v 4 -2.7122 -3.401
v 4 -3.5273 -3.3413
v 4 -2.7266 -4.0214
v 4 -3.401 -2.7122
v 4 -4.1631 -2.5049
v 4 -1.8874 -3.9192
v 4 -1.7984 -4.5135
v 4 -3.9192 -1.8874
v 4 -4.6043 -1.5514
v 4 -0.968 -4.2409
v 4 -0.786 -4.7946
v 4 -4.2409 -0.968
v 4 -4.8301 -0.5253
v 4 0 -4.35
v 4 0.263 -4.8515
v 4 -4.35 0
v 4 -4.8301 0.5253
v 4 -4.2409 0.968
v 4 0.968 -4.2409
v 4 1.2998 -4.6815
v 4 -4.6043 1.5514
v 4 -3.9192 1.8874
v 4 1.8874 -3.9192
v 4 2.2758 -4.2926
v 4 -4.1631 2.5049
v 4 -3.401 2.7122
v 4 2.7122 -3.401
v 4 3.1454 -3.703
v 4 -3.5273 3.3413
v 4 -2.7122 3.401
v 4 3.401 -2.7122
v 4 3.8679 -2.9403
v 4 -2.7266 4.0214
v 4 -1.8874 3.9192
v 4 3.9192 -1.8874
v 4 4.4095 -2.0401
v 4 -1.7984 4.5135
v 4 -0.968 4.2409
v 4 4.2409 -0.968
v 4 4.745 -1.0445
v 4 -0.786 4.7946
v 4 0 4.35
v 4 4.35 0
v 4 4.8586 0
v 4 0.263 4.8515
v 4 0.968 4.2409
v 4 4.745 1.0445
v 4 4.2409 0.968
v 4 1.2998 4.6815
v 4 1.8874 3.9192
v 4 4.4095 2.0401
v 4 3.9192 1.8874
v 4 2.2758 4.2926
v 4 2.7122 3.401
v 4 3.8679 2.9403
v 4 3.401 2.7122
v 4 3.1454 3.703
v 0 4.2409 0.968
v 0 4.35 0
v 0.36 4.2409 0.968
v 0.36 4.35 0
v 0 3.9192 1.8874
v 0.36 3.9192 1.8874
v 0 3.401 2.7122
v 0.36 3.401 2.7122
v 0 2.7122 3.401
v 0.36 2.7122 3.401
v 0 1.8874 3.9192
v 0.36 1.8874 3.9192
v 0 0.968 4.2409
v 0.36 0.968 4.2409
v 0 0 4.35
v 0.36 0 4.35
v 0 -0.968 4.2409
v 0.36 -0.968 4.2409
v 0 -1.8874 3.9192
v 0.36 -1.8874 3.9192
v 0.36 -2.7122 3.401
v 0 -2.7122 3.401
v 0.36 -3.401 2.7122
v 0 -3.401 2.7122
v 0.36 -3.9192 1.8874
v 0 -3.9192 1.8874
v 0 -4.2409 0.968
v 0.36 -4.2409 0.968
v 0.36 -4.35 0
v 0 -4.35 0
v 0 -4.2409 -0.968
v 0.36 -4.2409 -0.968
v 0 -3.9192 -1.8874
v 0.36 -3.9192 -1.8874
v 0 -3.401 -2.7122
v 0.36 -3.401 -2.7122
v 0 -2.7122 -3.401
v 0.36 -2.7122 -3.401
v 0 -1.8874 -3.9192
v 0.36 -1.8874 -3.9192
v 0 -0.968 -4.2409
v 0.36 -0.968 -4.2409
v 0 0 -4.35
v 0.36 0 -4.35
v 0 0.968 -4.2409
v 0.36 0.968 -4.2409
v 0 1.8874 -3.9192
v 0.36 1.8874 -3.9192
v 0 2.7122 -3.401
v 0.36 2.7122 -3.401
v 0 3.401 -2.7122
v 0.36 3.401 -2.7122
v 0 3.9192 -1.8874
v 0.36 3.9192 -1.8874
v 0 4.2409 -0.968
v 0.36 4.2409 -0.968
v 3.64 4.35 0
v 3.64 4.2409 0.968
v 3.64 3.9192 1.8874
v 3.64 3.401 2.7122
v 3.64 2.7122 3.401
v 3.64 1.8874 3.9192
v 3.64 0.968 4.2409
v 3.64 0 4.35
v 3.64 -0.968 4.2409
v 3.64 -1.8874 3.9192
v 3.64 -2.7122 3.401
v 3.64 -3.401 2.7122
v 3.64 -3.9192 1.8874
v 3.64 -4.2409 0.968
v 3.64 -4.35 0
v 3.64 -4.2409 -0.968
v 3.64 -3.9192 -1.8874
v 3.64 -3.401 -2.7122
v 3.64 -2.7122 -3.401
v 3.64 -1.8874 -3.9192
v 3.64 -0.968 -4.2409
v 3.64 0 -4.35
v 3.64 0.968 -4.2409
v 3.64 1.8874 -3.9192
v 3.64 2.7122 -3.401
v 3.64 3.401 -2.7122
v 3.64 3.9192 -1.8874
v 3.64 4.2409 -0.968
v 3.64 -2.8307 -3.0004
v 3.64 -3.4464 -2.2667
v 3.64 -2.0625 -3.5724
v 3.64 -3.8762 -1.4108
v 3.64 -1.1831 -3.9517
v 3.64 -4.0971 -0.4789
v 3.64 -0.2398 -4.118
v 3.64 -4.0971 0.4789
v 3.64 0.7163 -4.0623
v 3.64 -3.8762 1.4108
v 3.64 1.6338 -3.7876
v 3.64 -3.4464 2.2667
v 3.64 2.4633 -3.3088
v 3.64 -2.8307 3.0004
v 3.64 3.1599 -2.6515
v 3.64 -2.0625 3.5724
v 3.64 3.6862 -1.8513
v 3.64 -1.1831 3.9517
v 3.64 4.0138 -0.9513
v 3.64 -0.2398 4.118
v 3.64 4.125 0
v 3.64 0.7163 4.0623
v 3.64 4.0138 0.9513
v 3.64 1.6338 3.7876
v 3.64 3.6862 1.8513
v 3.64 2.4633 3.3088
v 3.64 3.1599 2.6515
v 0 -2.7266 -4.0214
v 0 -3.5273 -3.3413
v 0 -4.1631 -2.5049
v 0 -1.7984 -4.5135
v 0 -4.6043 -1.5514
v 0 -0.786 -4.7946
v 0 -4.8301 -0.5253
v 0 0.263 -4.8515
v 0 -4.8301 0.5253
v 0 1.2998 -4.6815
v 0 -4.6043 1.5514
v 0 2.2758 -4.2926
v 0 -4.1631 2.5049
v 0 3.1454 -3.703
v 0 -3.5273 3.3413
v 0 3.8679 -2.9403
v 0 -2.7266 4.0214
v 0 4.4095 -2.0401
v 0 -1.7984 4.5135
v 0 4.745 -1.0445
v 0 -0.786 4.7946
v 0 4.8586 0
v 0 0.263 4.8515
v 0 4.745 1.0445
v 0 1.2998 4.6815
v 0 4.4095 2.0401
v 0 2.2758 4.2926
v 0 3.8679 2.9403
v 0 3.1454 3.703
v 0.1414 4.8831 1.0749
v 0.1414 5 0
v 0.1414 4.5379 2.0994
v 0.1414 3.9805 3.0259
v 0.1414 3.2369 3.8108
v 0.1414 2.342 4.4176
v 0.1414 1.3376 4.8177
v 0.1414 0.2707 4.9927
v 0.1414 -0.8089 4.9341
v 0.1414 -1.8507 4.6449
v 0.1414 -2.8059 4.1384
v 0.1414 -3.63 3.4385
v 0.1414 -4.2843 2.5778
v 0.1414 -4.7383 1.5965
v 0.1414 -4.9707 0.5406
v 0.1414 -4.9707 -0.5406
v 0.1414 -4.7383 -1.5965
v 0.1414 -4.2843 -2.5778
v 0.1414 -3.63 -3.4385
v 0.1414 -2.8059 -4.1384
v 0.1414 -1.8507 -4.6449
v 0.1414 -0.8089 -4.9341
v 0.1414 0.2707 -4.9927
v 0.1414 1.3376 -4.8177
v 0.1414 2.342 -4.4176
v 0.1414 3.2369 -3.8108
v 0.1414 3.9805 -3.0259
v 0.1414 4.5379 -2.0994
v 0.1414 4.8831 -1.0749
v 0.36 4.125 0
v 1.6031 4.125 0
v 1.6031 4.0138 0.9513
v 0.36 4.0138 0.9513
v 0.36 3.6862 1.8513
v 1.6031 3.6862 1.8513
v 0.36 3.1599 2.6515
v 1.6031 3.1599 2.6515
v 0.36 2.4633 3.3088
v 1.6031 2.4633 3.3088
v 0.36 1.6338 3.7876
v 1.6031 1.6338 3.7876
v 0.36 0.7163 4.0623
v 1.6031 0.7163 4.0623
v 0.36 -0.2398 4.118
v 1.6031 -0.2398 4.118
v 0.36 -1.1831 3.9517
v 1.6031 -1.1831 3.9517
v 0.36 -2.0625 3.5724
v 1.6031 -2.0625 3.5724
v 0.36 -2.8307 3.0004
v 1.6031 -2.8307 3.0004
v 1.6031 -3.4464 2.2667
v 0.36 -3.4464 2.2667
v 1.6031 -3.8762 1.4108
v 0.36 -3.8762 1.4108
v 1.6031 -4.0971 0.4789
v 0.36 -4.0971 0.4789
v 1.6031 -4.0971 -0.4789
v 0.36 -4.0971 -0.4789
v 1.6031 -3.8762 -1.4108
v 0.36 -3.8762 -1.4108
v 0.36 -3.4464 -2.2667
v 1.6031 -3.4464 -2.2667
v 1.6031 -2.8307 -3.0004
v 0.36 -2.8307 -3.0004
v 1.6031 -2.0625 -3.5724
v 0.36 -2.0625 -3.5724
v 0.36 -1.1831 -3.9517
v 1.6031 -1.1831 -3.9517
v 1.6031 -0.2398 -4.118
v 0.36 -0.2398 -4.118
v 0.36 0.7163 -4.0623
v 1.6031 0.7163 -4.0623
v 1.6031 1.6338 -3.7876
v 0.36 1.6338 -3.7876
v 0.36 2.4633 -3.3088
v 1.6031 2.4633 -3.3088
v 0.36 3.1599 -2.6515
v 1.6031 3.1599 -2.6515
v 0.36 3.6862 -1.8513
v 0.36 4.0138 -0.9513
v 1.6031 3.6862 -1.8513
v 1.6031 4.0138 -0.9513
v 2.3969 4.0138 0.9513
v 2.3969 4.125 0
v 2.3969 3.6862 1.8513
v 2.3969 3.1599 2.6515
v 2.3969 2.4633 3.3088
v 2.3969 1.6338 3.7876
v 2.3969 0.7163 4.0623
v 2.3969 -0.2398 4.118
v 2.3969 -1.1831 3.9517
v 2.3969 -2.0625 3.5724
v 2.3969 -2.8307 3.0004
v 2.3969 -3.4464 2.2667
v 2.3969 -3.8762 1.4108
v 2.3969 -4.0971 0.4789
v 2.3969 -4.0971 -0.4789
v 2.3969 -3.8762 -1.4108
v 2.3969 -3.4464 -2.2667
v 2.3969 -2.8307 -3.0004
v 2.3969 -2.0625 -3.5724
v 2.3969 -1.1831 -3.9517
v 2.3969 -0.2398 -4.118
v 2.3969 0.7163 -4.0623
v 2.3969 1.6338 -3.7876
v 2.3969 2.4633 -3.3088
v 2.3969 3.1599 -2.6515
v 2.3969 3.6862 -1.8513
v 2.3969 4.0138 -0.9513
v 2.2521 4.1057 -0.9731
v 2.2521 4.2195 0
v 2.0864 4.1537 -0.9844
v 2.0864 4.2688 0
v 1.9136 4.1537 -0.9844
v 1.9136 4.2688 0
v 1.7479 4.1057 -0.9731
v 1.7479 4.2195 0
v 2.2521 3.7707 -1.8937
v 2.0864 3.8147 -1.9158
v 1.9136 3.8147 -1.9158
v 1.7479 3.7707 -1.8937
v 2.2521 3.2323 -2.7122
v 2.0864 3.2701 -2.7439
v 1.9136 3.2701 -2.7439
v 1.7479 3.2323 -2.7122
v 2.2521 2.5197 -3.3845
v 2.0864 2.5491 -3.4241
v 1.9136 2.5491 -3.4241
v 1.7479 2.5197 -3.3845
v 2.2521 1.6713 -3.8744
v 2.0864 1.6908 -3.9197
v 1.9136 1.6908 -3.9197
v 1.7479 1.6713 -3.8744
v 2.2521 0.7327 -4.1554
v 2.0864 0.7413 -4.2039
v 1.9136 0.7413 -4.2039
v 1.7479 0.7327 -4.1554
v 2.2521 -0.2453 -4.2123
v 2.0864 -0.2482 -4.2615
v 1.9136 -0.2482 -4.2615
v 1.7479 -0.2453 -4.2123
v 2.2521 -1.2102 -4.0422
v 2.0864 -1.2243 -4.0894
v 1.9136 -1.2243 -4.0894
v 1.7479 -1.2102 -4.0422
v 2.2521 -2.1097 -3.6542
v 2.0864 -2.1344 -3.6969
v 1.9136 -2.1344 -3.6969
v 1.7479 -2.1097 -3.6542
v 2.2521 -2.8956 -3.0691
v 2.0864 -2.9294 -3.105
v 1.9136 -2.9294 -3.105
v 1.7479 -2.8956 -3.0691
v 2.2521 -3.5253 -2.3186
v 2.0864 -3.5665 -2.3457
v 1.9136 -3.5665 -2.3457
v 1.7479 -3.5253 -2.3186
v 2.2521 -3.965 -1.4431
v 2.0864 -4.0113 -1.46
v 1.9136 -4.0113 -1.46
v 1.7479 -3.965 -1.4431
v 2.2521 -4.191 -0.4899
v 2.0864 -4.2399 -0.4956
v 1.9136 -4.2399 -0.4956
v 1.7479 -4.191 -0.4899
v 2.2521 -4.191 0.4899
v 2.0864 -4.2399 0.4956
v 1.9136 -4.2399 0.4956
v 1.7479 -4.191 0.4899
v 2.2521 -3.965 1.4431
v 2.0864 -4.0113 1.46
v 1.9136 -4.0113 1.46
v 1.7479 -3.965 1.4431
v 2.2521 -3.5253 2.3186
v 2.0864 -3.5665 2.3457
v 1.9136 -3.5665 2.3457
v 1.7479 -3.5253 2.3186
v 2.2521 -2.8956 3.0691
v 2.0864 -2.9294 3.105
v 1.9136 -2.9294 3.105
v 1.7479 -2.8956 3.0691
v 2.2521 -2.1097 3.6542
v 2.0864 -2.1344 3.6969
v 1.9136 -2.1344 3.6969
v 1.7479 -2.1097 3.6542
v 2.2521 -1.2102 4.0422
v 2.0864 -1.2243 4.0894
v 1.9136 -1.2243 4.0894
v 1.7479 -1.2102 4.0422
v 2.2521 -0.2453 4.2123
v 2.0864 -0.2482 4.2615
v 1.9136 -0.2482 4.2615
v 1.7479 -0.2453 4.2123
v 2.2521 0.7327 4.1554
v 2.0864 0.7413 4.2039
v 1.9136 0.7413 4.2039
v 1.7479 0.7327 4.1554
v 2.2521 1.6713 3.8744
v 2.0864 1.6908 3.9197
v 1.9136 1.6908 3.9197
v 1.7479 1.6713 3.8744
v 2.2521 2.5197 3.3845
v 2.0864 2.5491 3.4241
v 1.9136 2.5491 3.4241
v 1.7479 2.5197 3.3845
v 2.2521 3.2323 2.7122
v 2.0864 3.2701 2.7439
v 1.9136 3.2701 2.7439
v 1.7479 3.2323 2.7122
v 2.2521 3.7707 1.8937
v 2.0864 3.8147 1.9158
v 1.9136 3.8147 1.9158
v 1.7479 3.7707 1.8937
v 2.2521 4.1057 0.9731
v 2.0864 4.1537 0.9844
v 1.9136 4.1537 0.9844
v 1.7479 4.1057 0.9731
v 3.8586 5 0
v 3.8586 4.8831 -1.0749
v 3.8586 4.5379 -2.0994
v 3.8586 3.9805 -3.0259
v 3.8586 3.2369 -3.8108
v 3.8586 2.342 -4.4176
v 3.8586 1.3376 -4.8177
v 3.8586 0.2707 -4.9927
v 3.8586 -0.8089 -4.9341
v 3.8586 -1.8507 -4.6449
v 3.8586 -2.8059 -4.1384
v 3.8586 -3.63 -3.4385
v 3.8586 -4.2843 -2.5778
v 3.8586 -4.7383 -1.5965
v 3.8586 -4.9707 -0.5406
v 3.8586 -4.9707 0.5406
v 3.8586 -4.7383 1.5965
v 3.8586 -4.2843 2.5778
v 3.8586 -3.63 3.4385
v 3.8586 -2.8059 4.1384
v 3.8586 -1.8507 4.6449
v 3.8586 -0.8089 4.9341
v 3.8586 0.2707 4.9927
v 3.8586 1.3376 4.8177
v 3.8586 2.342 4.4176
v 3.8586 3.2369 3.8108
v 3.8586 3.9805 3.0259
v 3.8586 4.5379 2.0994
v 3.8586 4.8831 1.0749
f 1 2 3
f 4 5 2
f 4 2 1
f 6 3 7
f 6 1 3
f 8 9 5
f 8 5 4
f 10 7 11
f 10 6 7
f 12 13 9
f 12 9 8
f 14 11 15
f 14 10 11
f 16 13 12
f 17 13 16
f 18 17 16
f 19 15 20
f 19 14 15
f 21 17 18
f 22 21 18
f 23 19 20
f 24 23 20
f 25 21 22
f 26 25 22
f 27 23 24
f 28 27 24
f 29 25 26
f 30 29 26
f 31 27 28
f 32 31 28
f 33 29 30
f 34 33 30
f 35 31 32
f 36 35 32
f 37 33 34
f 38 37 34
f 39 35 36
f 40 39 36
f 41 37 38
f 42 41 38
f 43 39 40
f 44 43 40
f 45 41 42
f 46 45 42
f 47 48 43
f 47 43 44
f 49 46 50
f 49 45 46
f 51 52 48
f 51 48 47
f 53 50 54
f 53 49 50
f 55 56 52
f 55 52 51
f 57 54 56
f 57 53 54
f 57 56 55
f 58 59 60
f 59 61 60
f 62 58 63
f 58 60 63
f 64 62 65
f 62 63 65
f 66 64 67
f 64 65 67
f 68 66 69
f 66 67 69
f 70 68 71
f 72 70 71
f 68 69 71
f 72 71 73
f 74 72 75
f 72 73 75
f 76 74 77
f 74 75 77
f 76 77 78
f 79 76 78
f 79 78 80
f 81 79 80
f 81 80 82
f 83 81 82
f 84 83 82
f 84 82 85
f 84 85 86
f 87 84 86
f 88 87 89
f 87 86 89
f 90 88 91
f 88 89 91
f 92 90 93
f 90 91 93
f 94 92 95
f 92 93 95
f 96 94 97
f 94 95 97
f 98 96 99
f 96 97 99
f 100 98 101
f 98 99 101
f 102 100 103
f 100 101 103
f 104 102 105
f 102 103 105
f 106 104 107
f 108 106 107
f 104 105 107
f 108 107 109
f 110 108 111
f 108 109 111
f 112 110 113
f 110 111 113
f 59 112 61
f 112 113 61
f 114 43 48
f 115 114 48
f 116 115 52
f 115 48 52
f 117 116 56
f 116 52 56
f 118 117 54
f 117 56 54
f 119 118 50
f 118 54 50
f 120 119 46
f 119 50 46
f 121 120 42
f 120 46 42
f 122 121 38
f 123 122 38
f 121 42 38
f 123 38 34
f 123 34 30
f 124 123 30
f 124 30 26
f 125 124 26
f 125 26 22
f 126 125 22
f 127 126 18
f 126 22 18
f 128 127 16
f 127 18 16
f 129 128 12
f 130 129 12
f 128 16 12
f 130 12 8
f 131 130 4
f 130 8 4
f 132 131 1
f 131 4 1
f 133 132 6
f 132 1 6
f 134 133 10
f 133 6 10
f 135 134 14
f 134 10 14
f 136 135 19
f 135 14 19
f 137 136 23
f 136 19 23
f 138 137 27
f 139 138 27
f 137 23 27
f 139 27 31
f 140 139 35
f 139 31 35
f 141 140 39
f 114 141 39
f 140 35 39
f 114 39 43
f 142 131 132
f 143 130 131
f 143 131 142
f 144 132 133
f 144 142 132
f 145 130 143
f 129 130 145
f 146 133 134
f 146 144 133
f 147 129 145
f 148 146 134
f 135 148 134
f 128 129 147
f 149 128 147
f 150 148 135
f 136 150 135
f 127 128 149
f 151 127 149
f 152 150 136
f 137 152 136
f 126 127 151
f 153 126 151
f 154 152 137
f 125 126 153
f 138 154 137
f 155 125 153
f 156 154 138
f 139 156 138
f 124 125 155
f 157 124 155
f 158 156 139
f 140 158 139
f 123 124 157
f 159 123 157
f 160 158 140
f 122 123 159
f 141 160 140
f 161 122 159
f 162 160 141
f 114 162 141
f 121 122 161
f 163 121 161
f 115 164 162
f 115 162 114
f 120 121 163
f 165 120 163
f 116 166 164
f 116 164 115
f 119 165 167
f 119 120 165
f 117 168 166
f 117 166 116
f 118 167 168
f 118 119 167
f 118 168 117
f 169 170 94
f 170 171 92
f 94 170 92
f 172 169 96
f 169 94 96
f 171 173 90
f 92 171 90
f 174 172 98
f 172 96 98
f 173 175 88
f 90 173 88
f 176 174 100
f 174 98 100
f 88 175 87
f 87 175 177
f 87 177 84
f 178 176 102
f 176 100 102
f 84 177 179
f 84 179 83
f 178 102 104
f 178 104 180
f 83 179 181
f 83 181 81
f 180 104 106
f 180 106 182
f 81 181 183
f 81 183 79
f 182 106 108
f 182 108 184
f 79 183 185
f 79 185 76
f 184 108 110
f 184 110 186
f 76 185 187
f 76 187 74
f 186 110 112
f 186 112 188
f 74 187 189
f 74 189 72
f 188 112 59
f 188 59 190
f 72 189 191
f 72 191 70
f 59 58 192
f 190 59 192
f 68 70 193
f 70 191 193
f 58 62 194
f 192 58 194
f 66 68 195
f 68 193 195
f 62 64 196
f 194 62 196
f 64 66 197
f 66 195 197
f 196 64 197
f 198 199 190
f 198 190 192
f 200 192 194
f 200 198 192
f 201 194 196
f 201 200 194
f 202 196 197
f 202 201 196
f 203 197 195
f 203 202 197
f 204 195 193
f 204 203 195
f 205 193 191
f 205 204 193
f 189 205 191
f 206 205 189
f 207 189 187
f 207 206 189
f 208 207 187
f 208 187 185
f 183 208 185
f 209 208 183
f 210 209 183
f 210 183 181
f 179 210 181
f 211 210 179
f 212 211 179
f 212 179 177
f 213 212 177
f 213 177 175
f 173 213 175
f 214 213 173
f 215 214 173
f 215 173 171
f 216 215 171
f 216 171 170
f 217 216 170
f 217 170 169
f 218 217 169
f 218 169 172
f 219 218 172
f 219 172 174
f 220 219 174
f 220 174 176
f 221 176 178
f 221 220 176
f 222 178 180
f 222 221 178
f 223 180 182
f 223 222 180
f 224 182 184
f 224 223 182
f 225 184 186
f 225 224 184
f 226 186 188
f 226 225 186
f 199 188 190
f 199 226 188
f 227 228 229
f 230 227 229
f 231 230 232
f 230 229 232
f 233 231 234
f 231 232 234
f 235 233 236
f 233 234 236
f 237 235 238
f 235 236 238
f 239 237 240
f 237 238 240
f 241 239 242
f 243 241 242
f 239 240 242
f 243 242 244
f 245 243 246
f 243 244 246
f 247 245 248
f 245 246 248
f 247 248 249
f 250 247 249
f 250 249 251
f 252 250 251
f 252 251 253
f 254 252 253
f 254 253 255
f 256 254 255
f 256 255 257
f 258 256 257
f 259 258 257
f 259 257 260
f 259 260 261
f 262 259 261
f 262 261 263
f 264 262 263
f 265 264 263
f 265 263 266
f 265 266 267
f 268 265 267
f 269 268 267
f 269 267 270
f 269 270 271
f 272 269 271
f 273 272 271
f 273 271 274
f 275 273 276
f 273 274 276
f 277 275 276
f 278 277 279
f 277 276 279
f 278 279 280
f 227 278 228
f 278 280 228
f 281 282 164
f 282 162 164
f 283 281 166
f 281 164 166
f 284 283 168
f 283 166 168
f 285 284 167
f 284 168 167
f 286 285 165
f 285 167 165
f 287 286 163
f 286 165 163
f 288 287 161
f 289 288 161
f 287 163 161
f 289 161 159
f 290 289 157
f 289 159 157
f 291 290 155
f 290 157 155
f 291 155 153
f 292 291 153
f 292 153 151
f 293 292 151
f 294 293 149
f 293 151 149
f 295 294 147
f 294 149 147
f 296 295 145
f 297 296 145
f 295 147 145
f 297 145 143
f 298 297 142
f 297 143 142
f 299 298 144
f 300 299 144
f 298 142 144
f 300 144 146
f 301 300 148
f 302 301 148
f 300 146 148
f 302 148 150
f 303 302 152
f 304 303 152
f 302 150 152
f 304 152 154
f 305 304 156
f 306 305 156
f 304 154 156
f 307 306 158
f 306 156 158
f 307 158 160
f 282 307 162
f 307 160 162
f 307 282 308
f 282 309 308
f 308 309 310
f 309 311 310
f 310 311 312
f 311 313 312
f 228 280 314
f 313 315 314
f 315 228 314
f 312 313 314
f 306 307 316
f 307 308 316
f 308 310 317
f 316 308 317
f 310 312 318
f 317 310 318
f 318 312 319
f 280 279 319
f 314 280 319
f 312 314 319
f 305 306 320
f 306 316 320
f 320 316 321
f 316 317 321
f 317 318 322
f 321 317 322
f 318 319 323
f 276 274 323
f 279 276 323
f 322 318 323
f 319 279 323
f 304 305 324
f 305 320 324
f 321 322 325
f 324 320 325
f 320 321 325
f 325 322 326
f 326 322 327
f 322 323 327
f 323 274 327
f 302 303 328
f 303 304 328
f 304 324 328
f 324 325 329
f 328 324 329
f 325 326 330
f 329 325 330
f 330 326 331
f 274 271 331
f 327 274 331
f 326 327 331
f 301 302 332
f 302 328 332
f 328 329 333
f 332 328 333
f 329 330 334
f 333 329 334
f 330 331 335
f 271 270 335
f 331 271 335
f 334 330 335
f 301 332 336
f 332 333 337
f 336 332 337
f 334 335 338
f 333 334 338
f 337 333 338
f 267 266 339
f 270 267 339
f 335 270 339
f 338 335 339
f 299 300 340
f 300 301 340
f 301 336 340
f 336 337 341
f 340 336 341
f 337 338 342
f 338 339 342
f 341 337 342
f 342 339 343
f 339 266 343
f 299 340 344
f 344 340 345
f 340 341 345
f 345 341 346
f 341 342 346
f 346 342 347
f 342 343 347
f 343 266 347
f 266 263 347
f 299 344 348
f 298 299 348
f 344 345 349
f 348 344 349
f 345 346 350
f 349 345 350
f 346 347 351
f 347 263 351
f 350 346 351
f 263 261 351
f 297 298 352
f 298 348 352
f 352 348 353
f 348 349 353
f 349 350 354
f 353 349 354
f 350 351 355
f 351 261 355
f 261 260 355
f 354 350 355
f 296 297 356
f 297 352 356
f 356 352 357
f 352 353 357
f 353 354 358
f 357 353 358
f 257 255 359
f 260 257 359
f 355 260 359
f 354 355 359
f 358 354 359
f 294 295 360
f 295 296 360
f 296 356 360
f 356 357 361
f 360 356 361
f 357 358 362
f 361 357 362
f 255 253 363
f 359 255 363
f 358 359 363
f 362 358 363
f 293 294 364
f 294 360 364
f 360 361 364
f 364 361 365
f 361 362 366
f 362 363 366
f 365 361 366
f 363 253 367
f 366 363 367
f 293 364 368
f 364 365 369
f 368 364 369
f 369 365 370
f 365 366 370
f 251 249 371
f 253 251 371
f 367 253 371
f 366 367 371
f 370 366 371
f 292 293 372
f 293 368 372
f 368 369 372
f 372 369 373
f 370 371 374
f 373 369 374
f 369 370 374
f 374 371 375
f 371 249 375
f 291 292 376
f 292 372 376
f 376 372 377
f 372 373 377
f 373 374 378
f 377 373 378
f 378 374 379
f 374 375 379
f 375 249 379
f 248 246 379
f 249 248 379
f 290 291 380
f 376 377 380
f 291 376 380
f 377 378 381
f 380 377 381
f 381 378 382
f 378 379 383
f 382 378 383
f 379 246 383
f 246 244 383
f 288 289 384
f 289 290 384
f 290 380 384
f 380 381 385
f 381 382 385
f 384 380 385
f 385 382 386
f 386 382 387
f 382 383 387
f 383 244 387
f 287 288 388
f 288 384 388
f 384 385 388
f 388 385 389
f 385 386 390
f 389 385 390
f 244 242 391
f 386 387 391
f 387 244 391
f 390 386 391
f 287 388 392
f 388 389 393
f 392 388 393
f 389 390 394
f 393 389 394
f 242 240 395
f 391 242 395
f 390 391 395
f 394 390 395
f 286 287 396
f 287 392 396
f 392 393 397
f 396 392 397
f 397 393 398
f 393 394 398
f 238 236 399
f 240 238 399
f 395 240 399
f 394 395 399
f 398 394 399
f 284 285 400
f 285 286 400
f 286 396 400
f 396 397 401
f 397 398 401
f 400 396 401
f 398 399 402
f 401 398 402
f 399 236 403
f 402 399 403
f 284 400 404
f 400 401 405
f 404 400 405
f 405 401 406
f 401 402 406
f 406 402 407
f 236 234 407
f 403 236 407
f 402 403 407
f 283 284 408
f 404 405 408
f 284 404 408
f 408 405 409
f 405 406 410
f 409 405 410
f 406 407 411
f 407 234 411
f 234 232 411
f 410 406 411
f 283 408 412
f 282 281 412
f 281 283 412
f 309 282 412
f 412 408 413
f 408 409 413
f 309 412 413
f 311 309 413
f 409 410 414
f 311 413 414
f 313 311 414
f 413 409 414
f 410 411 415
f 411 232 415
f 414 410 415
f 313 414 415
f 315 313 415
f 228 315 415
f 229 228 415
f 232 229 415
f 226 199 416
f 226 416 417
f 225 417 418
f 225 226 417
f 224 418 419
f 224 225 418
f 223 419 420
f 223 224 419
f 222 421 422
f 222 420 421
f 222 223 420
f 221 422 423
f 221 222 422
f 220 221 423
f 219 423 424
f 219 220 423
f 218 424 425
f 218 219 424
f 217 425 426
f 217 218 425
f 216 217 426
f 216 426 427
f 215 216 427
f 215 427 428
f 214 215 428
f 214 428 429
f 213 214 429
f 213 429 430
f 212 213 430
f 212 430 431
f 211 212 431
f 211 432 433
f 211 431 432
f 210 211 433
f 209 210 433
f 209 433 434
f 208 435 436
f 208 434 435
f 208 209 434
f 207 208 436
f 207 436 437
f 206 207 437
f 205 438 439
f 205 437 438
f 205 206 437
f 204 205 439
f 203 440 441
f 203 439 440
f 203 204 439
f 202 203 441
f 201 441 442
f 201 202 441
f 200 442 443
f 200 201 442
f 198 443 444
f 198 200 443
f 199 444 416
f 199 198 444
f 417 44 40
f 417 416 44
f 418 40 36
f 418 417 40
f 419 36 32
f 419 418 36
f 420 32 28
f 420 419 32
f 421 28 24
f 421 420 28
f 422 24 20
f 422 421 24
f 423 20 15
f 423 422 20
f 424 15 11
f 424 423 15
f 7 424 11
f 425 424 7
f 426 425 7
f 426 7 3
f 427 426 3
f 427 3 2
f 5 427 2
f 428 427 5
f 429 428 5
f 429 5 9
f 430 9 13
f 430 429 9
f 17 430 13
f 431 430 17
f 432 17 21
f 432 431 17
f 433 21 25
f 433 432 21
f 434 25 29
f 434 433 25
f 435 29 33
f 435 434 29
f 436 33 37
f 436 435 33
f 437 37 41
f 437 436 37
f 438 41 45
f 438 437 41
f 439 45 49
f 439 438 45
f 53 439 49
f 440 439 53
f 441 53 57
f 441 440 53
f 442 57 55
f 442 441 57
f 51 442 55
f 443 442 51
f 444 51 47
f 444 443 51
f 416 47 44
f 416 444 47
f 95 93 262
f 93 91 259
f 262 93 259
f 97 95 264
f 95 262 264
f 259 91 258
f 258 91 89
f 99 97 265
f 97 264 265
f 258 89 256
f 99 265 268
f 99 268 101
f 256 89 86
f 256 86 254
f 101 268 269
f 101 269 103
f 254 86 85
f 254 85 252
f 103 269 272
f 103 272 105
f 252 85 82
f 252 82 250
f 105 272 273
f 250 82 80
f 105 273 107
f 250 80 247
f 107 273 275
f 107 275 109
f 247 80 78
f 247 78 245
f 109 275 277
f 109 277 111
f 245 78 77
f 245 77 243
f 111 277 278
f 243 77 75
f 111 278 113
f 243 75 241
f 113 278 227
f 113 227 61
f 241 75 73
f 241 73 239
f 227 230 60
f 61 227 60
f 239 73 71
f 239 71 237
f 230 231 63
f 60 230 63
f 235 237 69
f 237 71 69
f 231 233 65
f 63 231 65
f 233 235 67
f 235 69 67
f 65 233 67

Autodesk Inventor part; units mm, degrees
sketch "Sketch_4" plane through (0, 0, 0) normal (0, 0, 1) x (1, 0, 0)
  line L0 (4, 0) -> (0, 0)
  line L1 (0, 4.8586) -> (0, 4.35)
  line L2 (0, 4.35) -> (0.36, 4.35)
  line L3 (0.36, 4.35) -> (0.36, 4.125)
  line L4 (0.36, 4.125) -> (1.6031, 4.125)
  arc A0 (2.3969, 4.125) -> (1.6031, 4.125) centre (2, 3.675) ccw
  line L5 (2.3969, 4.125) -> (3.64, 4.125)
  line L6 (3.64, 4.125) -> (3.64, 4.35)
  line L7 (3.64, 4.35) -> (4, 4.35)
  line L8 (4, 4.35) -> (4, 4.8586)
  line L9 (4, 4.8586) -> (3.8586, 5)
  line L10 (3.8586, 5) -> (0.1414, 5)
  line L11 (0.1414, 5) -> (0, 4.8586)
revolve "Revolution1" add sketch "Sketch_4" angle 360 about axis through (4, 0, 0) along (1, 0, 0)
ref_plane "center_XY" through (0, 0, 0) normal (1, 0, 0) x (0, 0, -1)
ref_plane "center_YZ" through (0, 0, 0) normal (0, 0, -1) x (0, 1, 0)
ref_plane "center_ZX" through (0, 0, 0) normal (0, 1, 0) x (1, 0, 0)
ref_plane "or_1_1_XY" through (2, 3.675, 0) normal (1, 0, 0) x (0, 0, -1)
ref_plane "or_1_1_YZ" through (2, 3.675, 0) normal (0, 0, -1) x (0, 1, 0)
ref_plane "or_1_1_ZX" through (2, 3.675, 0) normal (0, 1, 0) x (1, 0, 0)
ref_plane "or_1_10_XY" through (2, 2.9731, -2.1601) normal (1, 0, 0) x (0, 0, -1)
ref_plane "or_1_10_YZ" through (2, 2.9731, -2.1601) normal (0, 0, -1) x (0, 1, 0)
ref_plane "or_1_10_ZX" through (2, 2.9731, -2.1601) normal (0, 1, 0) x (1, 0, 0)
ref_plane "or_1_2_XY" through (2, 2.9731, 2.1601) normal (1, 0, 0) x (0, 0, -1)
ref_plane "or_1_2_YZ" through (2, 2.9731, 2.1601) normal (0, 0, -1) x (0, 1, 0)
ref_plane "or_1_2_ZX" through (2, 2.9731, 2.1601) normal (0, 1, 0) x (1, 0, 0)
ref_plane "or_1_3_XY" through (2, 1.1356, 3.4951) normal (1, 0, 0) x (0, 0, -1)
ref_plane "or_1_3_YZ" through (2, 1.1356, 3.4951) normal (0, 0, -1) x (0, 1, 0)
ref_plane "or_1_3_ZX" through (2, 1.1356, 3.4951) normal (0, 1, 0) x (1, 0, 0)
ref_plane "or_1_4_XY" through (2, -1.1356, 3.4951) normal (1, 0, 0) x (0, 0, -1)
ref_plane "or_1_4_YZ" through (2, -1.1356, 3.4951) normal (0, 0, -1) x (0, 1, 0)
ref_plane "or_1_4_ZX" through (2, -1.1356, 3.4951) normal (0, 1, 0) x (1, 0, 0)
ref_plane "or_1_5_XY" through (2, -2.9731, 2.1601) normal (1, 0, 0) x (0, 0, -1)
ref_plane "or_1_5_YZ" through (2, -2.9731, 2.1601) normal (0, 0, -1) x (0, 1, 0)
ref_plane "or_1_5_ZX" through (2, -2.9731, 2.1601) normal (0, 1, 0) x (1, 0, 0)
ref_plane "or_1_6_XY" through (2, -3.675, 0) normal (1, 0, 0) x (0, 0, -1)
ref_plane "or_1_6_YZ" through (2, -3.675, 0) normal (0, 0, -1) x (0, 1, 0)
ref_plane "or_1_6_ZX" through (2, -3.675, 0) normal (0, 1, 0) x (1, 0, 0)
ref_plane "or_1_7_XY" through (2, -2.9731, -2.1601) normal (1, 0, 0) x (0, 0, -1)
ref_plane "or_1_7_YZ" through (2, -2.9731, -2.1601) normal (0, 0, -1) x (0, 1, 0)
ref_plane "or_1_7_ZX" through (2, -2.9731, -2.1601) normal (0, 1, 0) x (1, 0, 0)
ref_plane "or_1_8_XY" through (2, -1.1356, -3.4951) normal (1, 0, 0) x (0, 0, -1)
ref_plane "or_1_8_YZ" through (2, -1.1356, -3.4951) normal (0, 0, -1) x (0, 1, 0)
ref_plane "or_1_8_ZX" through (2, -1.1356, -3.4951) normal (0, 1, 0) x (1, 0, 0)
ref_plane "or_1_9_XY" through (2, 1.1356, -3.4951) normal (1, 0, 0) x (0, 0, -1)
ref_plane "or_1_9_YZ" through (2, 1.1356, -3.4951) normal (0, 0, -1) x (0, 1, 0)
ref_plane "or_1_9_ZX" through (2, 1.1356, -3.4951) normal (0, 1, 0) x (1, 0, 0)
ref_plane "outer_XY" through (4, 0, 0) normal (1, 0, 0) x (0, 0, -1)
ref_plane "outer_YZ" through (4, 0, 0) normal (0, 0, -1) x (0, 1, 0)
ref_plane "outer_ZX" through (4, 0, 0) normal (0, 1, 0) x (1, 0, 0)
properties part number "WML5010ZZ Outer ring"
